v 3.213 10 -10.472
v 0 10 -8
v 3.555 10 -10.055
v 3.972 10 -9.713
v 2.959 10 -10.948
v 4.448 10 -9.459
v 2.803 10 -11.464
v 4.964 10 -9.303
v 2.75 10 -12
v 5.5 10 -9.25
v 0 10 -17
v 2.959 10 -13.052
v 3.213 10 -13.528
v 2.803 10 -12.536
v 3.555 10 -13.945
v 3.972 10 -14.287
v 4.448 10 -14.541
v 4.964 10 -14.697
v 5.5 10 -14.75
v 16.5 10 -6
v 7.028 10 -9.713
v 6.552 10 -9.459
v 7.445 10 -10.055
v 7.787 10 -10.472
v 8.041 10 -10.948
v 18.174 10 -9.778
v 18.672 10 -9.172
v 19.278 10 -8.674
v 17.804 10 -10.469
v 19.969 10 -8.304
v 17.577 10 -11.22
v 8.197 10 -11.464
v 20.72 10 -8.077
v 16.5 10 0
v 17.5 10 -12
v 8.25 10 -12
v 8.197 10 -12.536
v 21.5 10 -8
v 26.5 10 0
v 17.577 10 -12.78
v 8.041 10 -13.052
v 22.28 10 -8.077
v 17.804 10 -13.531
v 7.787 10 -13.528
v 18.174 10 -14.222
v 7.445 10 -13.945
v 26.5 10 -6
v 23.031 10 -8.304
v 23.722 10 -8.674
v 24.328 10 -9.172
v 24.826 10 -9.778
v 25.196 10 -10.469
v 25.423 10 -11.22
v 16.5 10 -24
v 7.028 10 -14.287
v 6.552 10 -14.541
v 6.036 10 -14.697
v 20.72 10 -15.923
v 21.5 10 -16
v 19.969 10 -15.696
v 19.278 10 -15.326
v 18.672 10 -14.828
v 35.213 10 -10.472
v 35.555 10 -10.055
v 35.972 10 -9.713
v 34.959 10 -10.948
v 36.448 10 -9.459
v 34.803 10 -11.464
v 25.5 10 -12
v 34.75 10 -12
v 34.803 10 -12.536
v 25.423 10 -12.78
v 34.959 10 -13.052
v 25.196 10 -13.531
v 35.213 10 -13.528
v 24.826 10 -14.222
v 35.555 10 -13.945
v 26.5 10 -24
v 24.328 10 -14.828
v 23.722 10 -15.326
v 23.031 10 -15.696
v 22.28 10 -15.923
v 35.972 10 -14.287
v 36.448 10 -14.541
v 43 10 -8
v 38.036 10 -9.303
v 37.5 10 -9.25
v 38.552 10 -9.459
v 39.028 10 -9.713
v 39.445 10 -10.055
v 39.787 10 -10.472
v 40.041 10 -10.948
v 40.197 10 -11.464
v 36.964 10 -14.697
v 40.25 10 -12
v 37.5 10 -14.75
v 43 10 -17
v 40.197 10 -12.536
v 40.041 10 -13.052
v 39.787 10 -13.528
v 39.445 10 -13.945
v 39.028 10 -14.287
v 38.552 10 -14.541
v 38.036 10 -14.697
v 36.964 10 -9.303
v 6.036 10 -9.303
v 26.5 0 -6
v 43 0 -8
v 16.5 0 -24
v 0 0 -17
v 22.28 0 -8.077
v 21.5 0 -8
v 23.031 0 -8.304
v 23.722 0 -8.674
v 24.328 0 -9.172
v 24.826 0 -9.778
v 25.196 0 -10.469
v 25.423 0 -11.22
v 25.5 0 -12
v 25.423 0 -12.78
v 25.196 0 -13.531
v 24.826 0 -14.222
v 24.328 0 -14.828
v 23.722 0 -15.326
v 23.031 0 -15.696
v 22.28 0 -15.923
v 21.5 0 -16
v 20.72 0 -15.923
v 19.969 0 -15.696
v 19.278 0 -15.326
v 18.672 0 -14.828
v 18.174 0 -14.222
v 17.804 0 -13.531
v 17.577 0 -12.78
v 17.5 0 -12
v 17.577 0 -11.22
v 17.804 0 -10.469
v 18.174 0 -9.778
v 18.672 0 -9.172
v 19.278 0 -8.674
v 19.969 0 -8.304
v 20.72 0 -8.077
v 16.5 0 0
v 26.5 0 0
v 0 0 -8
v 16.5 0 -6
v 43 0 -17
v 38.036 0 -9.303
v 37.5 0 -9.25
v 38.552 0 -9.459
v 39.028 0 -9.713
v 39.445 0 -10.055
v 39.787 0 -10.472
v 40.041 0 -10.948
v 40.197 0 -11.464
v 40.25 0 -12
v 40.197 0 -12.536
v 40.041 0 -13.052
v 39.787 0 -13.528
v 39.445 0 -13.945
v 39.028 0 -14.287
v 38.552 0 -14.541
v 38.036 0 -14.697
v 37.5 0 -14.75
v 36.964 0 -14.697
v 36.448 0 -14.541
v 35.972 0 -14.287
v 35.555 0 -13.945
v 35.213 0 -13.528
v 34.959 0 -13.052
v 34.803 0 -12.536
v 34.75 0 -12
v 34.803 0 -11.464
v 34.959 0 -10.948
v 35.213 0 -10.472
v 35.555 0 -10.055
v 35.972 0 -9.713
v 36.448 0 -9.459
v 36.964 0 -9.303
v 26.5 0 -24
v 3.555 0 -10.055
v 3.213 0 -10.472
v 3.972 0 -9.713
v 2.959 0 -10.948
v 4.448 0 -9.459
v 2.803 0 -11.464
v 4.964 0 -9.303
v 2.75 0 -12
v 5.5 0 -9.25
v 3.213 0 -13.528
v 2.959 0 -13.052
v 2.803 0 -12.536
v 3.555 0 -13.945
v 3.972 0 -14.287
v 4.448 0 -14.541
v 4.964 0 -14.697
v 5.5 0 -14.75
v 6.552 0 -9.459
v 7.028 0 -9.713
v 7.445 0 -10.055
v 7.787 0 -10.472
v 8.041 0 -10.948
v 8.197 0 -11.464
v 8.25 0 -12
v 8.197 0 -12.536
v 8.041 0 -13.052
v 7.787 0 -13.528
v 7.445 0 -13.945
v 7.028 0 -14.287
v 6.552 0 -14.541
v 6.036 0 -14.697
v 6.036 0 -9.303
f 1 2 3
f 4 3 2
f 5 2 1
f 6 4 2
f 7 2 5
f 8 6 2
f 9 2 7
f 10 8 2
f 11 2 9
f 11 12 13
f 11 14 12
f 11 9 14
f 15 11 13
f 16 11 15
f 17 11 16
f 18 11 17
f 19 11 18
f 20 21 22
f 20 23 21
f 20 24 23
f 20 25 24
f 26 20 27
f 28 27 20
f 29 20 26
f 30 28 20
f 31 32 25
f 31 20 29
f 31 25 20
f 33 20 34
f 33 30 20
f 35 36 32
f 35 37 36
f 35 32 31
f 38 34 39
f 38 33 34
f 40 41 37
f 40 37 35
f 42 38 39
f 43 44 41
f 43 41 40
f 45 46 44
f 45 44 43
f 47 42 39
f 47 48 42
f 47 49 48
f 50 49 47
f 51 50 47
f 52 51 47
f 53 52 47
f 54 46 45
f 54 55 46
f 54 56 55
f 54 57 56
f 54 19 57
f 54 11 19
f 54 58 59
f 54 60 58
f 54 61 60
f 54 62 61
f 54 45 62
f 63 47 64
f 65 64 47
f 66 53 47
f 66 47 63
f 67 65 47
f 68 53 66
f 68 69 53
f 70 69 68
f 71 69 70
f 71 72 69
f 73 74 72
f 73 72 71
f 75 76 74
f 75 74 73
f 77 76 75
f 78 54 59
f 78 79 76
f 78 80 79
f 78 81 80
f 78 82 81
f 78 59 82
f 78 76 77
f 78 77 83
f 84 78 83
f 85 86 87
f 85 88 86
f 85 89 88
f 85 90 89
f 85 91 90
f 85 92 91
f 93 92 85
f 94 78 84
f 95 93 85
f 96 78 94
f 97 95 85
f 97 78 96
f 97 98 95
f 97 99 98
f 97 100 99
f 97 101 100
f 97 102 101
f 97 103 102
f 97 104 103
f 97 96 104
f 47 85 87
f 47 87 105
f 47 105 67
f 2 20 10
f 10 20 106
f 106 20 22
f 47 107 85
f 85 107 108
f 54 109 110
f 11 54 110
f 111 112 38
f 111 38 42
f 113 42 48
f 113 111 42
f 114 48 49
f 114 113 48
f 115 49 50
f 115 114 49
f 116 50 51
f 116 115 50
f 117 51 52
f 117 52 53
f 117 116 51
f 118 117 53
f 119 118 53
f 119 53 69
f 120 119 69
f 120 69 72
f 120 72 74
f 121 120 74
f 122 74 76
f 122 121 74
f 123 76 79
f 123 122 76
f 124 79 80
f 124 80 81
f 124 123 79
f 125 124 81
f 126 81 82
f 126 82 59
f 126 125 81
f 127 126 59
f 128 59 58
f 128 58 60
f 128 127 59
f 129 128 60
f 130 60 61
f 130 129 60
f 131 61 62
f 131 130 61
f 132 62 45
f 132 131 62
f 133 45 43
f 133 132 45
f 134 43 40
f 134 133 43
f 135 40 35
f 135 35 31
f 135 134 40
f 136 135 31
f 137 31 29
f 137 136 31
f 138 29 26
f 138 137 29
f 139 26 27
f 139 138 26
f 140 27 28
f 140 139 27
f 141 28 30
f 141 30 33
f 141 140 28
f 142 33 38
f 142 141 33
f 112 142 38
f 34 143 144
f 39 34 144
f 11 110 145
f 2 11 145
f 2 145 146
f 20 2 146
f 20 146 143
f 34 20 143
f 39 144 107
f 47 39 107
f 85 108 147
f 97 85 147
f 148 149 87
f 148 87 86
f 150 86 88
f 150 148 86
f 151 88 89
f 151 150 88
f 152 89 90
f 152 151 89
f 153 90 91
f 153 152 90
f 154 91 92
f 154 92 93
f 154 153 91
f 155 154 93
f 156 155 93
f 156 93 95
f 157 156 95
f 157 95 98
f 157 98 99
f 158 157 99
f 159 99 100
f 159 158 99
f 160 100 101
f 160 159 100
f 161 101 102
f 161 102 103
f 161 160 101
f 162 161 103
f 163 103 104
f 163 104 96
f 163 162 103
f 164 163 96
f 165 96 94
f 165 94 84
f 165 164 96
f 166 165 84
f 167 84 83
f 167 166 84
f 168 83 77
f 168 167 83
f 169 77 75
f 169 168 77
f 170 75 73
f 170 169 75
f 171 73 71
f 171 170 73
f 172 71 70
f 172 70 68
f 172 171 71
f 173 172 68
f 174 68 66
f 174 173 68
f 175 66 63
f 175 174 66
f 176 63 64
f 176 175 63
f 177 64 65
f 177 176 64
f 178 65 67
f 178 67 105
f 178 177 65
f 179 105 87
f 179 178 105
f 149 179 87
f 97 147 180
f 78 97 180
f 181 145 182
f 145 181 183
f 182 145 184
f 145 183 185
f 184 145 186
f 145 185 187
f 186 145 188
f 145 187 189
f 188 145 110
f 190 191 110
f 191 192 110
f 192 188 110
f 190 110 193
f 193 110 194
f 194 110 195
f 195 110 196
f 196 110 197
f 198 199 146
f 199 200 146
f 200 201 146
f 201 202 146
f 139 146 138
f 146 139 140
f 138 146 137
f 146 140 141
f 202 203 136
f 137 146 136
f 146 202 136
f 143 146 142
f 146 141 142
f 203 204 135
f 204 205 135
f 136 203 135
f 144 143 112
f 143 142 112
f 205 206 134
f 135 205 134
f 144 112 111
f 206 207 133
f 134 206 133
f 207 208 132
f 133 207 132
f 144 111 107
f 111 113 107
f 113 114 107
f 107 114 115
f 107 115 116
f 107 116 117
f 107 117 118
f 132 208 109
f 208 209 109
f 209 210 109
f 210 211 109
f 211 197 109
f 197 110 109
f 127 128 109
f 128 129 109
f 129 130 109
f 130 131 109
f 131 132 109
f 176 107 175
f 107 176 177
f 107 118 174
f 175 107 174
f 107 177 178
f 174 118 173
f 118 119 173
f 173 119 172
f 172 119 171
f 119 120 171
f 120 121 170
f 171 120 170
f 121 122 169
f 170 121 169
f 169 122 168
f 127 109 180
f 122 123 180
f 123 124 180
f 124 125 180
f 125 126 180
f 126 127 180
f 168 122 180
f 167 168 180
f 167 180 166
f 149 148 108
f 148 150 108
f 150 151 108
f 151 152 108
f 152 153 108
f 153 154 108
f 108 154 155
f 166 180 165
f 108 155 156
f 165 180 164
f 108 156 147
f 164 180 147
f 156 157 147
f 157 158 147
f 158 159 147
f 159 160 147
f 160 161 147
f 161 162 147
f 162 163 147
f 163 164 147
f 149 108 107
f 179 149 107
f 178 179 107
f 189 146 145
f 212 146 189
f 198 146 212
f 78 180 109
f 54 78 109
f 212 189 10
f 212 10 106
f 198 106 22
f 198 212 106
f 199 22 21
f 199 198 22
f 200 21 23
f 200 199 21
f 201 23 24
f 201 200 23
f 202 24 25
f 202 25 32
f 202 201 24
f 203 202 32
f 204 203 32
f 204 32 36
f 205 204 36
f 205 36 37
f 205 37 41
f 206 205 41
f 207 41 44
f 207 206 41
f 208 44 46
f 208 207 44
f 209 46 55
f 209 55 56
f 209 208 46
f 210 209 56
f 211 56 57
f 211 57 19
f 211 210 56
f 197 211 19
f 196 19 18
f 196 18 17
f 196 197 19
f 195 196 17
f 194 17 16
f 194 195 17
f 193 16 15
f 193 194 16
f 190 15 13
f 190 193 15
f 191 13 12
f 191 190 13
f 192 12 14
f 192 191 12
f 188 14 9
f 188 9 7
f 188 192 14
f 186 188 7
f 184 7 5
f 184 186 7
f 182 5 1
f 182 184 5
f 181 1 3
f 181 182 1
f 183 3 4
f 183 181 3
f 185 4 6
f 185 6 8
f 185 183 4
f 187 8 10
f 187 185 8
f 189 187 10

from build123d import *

# Parameters (mm, degrees)
SKETCH_1_R      = 2.75
SKETCH_1_R_2    = 4
EXTRUDE_1_DEPTH = 10


with BuildPart() as part:
    # Эскиз1 → Бобышка-Вытянуть1 (new body)
    with BuildSketch(Plane(origin=(0, 0, 0), x_dir=(1, 0, 0), z_dir=(0, 1, 0))):
        Polygon((16.5, 0), (26.5, 0), (26.5, 6), (43, 8), (43, 17), (26.5, 24), (16.5, 24), (0, 17), (0, 8), (16.5, 6), align=None)
        with Locations(Location((5.5, 12, 0), (0, 0, 270))):
            Circle(SKETCH_1_R, mode=Mode.SUBTRACT)
        with Locations(Location((37.5, 12, 0), (0, 0, 270))):
            Circle(SKETCH_1_R, mode=Mode.SUBTRACT)
        with Locations(Location((21.5, 12, 0), (0, 0, 270))):
            Circle(SKETCH_1_R_2, mode=Mode.SUBTRACT)
    extrude(amount=EXTRUDE_1_DEPTH)


solid = part.part
